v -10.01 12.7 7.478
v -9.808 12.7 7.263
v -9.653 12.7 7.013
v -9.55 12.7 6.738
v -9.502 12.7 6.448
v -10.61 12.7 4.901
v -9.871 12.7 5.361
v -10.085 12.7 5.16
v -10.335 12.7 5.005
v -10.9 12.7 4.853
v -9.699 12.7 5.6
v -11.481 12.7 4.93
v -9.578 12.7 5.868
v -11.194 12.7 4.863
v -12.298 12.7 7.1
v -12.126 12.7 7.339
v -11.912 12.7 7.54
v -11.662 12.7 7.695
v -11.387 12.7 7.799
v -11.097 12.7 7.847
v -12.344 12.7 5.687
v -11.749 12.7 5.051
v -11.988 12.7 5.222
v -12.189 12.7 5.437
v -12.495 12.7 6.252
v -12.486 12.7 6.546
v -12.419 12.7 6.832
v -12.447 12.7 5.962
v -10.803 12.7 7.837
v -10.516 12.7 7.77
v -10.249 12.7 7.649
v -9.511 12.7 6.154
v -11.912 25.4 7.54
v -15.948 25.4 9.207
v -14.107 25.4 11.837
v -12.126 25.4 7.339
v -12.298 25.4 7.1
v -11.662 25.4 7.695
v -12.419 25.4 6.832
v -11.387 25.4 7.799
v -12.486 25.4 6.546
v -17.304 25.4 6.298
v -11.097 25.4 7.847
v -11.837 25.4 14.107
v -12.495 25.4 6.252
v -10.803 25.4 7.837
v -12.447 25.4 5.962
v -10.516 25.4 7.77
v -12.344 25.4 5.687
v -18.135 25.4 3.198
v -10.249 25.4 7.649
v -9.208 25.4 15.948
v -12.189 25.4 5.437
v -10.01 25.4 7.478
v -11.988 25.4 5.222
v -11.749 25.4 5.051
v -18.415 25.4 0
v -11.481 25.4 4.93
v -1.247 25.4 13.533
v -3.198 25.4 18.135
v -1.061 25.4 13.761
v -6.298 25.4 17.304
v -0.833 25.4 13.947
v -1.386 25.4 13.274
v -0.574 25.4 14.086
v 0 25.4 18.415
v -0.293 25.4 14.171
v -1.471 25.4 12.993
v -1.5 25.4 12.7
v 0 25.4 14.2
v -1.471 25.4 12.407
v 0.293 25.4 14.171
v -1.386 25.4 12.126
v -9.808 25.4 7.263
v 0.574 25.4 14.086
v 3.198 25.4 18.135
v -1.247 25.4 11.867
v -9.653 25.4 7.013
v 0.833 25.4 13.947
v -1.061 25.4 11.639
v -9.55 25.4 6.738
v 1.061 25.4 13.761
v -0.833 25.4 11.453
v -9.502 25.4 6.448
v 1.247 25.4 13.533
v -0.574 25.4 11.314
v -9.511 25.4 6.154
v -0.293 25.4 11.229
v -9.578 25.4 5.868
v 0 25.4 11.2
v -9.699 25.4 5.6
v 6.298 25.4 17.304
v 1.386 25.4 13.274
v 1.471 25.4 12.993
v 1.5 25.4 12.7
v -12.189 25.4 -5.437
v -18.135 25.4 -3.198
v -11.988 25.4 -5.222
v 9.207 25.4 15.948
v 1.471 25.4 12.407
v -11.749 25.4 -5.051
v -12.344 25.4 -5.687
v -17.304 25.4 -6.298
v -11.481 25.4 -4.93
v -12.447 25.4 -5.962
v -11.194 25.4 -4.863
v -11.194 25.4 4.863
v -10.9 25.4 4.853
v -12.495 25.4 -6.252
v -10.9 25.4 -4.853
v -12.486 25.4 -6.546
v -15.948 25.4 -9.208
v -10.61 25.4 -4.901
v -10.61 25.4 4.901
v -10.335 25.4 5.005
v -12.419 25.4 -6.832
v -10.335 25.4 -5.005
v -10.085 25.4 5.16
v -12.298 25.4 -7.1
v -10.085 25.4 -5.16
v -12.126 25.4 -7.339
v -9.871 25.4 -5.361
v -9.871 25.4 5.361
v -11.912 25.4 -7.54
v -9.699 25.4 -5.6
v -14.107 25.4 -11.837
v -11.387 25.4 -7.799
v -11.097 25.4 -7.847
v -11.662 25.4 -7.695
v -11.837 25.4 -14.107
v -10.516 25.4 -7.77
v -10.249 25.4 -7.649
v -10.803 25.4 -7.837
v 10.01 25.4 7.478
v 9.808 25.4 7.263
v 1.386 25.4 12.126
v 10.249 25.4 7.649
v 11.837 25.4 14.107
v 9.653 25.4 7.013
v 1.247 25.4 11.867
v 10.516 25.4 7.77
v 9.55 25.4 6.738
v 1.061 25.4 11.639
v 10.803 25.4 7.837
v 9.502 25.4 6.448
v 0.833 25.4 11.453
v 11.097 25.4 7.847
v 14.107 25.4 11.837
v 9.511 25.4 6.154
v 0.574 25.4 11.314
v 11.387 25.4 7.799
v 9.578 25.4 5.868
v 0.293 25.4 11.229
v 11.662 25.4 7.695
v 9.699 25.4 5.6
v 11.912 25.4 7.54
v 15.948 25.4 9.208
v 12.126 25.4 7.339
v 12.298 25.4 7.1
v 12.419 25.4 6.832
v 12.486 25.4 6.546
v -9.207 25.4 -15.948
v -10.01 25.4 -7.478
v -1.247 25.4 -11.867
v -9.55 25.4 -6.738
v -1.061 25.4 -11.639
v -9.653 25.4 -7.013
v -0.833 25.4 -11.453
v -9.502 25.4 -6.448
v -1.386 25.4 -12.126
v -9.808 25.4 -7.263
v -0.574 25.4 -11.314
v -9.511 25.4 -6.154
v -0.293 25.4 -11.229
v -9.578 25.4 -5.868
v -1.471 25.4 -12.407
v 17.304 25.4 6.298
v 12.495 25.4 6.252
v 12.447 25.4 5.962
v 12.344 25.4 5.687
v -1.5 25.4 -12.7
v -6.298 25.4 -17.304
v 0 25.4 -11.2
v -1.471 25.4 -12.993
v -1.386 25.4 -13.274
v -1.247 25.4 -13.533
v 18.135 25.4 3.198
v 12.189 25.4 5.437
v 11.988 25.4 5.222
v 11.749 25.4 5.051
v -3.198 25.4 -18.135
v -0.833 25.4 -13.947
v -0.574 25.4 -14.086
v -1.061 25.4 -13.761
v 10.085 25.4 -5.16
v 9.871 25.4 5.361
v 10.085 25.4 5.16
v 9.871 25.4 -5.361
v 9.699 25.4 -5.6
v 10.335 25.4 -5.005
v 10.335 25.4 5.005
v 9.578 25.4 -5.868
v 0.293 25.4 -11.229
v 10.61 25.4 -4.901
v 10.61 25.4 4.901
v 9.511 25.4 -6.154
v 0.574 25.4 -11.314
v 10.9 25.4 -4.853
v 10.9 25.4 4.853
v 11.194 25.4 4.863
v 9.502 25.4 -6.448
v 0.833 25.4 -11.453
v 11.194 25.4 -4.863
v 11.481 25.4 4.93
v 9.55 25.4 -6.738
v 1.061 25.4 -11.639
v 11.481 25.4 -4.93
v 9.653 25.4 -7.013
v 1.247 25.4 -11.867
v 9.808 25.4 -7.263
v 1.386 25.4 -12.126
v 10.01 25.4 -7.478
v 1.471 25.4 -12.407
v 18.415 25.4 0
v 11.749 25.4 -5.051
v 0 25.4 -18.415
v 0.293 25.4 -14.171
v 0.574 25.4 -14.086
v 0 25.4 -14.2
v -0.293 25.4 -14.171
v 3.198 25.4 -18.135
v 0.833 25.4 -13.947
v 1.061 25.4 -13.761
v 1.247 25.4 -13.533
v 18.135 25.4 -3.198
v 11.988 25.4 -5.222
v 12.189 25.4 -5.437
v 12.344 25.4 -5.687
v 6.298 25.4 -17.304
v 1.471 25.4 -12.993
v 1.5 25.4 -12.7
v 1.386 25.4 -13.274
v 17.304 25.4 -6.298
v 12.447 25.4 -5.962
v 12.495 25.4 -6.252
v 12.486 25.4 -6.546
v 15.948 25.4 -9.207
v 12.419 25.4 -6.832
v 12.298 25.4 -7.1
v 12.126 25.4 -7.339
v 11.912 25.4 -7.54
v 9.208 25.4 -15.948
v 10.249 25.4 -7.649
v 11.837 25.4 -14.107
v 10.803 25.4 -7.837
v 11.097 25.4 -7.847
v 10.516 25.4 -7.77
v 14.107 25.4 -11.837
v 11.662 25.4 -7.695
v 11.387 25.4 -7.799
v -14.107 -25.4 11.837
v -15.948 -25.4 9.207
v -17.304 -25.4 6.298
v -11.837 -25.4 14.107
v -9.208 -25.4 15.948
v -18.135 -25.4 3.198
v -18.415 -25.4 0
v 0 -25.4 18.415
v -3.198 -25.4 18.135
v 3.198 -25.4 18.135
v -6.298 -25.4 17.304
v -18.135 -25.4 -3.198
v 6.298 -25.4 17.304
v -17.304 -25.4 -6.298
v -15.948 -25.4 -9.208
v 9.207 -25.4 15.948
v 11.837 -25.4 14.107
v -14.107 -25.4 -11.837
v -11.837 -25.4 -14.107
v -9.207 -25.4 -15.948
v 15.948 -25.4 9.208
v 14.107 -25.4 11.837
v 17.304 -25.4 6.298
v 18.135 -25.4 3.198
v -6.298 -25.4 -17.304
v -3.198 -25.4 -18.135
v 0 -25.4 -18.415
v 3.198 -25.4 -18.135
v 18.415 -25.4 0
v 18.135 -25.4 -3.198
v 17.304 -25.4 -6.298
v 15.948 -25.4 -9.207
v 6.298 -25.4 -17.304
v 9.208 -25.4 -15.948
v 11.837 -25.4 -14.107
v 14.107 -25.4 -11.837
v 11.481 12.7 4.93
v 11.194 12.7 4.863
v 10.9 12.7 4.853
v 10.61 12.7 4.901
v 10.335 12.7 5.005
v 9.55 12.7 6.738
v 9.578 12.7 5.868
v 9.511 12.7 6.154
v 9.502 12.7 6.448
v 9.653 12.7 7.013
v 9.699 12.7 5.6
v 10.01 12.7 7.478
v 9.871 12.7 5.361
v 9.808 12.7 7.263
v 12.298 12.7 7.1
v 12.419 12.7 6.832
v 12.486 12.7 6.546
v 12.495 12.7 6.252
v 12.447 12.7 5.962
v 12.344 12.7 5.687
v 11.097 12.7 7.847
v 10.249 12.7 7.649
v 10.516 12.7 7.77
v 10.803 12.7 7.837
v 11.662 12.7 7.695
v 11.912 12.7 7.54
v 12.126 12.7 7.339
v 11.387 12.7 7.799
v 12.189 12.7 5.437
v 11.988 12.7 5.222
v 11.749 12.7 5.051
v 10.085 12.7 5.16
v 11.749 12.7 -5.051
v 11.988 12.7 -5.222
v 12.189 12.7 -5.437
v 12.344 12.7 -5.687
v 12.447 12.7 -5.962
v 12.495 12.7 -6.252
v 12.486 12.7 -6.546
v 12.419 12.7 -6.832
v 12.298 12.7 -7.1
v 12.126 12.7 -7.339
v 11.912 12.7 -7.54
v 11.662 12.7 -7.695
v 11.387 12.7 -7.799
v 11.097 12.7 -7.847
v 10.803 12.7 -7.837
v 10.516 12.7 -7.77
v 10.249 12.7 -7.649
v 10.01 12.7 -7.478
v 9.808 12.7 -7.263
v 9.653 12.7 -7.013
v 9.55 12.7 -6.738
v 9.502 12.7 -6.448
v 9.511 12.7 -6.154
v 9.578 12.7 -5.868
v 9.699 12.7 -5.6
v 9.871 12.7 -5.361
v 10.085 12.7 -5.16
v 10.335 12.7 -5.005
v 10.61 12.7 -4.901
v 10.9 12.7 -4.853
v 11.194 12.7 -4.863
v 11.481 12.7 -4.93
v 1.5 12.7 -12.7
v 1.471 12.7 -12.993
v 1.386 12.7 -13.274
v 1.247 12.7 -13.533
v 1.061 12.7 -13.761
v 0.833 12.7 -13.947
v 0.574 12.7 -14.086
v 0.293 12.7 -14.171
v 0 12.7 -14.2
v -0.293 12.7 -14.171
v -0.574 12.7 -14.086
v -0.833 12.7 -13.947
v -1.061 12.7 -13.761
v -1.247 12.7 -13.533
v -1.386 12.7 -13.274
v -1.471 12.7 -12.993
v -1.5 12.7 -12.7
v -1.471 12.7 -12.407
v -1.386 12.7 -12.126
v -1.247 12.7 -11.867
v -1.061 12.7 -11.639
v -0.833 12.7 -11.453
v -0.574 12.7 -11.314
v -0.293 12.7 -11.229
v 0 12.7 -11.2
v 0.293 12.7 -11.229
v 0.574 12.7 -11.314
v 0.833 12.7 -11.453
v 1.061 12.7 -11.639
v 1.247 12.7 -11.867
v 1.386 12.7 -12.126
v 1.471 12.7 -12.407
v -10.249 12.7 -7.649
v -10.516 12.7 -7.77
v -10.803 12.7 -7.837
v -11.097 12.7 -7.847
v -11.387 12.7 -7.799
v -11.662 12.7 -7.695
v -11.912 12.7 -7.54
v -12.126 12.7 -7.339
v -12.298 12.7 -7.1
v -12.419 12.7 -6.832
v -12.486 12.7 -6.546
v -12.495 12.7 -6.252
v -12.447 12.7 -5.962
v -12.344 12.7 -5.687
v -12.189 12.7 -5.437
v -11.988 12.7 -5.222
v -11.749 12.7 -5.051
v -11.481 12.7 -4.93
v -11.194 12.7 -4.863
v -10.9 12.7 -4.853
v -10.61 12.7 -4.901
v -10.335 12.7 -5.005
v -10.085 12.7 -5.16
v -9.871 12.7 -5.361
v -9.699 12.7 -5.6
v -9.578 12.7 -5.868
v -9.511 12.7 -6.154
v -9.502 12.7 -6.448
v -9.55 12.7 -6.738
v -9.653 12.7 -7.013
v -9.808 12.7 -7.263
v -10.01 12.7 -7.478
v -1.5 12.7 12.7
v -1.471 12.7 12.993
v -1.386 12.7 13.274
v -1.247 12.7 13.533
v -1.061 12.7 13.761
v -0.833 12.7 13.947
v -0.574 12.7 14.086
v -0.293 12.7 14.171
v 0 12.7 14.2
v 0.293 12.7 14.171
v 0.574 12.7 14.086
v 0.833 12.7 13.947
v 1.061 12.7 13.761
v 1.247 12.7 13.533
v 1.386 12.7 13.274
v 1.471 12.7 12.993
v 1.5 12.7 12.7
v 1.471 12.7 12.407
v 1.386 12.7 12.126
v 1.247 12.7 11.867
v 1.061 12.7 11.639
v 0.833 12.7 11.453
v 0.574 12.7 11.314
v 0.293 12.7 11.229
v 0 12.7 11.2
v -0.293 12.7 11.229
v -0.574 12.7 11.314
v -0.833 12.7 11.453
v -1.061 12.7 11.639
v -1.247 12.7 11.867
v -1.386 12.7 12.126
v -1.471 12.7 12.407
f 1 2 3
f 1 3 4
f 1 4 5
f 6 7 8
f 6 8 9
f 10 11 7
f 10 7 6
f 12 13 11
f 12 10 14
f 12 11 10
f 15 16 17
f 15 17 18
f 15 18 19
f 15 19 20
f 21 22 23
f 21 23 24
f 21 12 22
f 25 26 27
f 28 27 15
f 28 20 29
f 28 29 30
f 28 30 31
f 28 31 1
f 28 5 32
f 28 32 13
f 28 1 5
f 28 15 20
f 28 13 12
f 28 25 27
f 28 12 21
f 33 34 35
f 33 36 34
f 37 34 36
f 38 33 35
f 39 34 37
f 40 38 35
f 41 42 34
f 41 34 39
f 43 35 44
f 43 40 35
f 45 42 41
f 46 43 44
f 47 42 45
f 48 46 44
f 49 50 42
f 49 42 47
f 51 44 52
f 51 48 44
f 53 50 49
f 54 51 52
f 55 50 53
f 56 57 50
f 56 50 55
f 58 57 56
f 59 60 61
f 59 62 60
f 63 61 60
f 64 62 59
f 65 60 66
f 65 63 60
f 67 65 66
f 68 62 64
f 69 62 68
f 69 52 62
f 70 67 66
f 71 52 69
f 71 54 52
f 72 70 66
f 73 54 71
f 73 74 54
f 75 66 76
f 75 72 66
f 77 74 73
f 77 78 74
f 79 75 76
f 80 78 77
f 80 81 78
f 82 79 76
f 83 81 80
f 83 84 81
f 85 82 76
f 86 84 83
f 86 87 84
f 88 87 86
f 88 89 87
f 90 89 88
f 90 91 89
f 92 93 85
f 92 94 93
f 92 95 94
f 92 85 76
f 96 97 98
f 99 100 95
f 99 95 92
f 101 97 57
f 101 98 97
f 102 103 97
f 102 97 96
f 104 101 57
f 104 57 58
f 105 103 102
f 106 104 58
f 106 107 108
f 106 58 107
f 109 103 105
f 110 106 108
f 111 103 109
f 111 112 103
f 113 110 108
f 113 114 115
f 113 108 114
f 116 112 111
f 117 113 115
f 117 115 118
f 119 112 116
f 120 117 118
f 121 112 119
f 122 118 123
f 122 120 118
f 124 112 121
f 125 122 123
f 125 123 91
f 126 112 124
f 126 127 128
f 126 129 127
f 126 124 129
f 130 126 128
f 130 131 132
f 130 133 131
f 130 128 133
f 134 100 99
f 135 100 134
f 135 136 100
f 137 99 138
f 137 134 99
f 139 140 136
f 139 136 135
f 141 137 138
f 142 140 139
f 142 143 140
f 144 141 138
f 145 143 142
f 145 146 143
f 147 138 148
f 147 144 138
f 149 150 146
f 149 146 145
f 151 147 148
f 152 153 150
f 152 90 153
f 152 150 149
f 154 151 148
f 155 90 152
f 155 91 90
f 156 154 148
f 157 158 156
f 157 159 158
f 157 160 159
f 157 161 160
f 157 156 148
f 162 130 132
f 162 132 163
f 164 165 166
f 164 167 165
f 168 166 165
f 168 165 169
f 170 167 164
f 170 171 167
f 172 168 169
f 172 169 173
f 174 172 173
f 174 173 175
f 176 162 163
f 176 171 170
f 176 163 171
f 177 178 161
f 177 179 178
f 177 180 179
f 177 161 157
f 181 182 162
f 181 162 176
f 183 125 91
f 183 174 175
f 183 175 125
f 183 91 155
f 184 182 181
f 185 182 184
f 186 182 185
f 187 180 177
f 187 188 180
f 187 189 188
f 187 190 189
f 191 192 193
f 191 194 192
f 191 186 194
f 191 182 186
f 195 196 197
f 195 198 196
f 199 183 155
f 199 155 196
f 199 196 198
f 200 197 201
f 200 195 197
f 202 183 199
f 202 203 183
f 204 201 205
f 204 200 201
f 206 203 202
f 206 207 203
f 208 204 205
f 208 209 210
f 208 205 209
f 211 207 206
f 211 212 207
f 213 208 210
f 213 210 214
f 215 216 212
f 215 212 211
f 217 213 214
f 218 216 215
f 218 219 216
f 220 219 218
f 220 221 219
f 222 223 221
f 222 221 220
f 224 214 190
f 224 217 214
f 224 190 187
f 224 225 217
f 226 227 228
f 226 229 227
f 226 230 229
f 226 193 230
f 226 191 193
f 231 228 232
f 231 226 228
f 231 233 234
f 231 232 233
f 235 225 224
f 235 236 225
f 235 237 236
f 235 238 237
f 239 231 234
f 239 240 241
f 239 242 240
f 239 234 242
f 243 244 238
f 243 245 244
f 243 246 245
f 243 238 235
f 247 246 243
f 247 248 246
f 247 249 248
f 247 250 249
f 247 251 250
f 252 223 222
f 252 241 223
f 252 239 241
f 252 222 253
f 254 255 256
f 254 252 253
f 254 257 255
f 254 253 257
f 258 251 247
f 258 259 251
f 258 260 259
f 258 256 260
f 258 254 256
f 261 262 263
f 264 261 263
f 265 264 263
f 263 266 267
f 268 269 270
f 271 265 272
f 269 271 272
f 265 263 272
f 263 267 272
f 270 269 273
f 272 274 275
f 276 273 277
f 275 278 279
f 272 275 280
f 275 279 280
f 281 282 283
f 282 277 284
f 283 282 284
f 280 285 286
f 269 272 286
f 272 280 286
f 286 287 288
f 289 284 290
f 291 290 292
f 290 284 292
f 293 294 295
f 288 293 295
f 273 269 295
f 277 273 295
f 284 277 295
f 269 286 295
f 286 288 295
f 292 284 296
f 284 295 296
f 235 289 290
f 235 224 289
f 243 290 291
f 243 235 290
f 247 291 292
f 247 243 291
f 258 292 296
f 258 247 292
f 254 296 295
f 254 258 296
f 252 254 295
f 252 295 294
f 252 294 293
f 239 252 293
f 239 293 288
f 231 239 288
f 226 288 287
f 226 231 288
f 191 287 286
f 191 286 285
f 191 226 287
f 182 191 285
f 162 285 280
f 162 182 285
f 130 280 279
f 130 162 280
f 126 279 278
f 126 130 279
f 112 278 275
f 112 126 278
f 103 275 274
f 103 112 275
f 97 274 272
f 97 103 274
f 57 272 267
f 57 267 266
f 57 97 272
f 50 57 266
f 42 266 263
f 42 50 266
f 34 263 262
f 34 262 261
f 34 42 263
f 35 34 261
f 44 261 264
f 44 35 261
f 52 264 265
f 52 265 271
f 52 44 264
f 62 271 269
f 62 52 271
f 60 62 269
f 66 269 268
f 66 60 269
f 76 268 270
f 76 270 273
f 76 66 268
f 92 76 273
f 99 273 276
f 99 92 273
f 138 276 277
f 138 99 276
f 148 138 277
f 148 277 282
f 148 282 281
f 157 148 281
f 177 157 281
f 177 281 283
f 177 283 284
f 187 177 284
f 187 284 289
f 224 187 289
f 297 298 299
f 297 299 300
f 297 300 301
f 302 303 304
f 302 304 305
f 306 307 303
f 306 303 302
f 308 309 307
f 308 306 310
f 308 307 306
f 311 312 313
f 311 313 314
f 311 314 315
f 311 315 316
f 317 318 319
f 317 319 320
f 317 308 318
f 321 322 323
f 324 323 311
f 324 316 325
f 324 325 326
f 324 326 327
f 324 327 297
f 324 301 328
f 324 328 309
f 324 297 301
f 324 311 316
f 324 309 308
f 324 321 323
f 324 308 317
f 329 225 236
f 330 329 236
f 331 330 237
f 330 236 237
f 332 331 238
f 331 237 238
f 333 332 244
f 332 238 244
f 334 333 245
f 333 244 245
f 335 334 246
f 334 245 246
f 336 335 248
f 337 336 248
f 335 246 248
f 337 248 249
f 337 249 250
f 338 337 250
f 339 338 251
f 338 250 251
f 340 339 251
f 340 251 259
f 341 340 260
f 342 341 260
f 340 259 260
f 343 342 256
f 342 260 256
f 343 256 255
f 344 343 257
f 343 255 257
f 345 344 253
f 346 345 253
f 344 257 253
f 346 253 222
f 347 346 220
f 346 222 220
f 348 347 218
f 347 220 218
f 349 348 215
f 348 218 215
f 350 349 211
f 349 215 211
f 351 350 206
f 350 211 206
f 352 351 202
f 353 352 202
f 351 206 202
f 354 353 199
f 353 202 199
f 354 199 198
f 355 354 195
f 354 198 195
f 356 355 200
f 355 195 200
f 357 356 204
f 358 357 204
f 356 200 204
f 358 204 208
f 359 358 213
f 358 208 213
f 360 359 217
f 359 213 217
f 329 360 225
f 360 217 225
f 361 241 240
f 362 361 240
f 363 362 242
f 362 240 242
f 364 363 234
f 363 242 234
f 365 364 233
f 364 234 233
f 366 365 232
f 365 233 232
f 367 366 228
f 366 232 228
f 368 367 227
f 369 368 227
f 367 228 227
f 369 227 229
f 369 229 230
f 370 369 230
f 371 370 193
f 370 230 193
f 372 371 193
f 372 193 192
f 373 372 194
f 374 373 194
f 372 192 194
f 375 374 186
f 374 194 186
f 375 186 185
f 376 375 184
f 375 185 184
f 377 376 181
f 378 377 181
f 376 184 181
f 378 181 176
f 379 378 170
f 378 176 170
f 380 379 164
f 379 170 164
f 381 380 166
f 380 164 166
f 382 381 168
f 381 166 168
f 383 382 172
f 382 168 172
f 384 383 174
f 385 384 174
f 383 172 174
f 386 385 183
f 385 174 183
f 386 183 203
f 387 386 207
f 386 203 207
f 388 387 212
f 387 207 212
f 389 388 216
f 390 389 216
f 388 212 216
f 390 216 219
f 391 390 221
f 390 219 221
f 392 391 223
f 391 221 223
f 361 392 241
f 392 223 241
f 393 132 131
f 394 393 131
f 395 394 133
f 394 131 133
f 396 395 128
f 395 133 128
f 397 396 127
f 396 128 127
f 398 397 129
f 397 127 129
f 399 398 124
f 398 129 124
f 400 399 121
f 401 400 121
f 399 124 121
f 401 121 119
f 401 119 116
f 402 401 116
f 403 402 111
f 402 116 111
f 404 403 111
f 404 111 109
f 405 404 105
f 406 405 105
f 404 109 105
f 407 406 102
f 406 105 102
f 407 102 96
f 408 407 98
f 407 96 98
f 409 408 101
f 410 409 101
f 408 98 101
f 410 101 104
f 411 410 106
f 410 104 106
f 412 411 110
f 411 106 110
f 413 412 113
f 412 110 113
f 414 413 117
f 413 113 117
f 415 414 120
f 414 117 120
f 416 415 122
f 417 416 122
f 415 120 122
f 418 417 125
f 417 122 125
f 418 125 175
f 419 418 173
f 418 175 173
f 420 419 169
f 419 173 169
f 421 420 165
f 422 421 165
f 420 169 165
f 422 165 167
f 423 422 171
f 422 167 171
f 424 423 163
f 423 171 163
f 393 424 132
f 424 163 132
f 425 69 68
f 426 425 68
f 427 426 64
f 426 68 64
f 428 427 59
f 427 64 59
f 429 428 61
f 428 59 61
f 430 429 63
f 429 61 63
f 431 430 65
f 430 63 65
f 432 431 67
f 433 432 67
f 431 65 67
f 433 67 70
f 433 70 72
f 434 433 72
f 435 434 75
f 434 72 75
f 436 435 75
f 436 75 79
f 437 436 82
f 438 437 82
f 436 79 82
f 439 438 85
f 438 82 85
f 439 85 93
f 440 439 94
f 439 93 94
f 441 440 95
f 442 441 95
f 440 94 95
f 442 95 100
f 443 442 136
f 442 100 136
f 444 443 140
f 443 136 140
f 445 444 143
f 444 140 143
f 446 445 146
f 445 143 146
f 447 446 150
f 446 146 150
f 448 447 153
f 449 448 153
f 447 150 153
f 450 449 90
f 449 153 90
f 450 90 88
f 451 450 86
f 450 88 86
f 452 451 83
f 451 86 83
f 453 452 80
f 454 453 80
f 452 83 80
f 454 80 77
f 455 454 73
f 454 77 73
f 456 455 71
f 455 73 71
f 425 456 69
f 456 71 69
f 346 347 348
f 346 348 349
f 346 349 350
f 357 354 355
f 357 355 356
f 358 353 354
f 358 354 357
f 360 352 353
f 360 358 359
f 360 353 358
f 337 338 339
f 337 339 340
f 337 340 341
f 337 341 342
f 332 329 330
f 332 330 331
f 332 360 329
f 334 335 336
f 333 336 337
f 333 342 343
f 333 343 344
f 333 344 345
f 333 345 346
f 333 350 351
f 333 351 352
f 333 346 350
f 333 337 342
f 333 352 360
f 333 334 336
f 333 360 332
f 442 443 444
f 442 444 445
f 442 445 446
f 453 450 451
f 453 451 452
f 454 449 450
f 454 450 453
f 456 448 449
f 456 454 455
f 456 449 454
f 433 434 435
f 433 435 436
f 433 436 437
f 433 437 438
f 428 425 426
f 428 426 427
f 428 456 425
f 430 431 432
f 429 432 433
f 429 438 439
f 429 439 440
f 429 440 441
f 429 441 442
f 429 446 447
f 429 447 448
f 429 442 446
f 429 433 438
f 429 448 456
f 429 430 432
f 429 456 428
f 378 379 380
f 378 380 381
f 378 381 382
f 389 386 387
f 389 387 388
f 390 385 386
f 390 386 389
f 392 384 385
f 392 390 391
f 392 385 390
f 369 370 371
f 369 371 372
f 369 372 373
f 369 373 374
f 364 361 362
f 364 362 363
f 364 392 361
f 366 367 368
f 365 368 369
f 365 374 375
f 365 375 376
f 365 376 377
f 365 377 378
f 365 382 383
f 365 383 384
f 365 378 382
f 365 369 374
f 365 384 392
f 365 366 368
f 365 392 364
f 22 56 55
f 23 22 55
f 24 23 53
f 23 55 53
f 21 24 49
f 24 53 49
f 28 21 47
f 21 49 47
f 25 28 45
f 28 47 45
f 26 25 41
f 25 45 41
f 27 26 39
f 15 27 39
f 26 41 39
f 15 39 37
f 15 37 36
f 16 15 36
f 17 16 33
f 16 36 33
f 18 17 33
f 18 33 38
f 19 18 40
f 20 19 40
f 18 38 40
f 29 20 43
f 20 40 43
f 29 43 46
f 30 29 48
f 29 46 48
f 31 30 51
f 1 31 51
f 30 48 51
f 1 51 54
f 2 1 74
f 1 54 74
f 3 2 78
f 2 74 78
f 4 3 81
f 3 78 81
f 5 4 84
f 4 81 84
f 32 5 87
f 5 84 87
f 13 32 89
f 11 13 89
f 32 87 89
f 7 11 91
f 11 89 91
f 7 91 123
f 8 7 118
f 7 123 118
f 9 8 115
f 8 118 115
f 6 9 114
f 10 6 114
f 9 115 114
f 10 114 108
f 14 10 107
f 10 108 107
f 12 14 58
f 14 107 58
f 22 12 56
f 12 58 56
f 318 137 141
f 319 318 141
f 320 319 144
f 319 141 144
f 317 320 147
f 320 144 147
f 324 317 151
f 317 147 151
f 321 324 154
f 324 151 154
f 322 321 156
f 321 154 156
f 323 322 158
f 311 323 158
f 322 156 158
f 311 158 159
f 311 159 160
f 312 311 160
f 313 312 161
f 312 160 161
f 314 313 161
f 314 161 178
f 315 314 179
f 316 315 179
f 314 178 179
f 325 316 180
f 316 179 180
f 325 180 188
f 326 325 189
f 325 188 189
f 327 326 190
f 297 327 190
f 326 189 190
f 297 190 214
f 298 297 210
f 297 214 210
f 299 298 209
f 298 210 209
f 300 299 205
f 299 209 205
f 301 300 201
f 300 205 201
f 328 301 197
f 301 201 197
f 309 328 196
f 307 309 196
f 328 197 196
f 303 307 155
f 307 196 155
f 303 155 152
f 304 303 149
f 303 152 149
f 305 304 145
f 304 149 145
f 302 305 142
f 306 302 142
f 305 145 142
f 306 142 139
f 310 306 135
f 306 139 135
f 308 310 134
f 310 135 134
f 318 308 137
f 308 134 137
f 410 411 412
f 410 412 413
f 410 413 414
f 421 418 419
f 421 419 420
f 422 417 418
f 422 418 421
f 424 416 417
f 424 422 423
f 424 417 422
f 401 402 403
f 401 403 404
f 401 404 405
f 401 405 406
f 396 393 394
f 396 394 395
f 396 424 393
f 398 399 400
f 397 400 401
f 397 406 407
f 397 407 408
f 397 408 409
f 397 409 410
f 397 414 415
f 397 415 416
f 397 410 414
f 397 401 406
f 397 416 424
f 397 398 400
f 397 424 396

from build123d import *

# Parameters (mm, degrees)
SKETCH1_R           = 18.415
BOSS_EXTRUDE1_DEPTH = 25.4
SKETCH2_R           = 1.5
CUT_EXTRUDE1_DEPTH  = 12.7
CIRPATTERN1_COUNT   = 6


with BuildPart() as part:
    # Sketch1 → Boss-Extrude1 (new body, symmetric)
    with BuildSketch(Plane(origin=(0, 0, 0), x_dir=(1, 0, 0), z_dir=(0, 1, 0))):
        Circle(SKETCH1_R)
    extrude(amount=BOSS_EXTRUDE1_DEPTH, both=True)

    # Sketch2 → Cut-Extrude1 (cut)
    with BuildSketch(Plane(origin=(0, 25.4, 0), x_dir=(1, 0, 0), z_dir=(0, 1, 0))):
        with Locations((0, 12.7)):
            Circle(SKETCH2_R)
    cut_extrude1 = extrude(amount=-CUT_EXTRUDE1_DEPTH, mode=Mode.SUBTRACT)

    # CirPattern1: Cut-Extrude1 ×6 about axis
    cirpattern1_axis = Axis((0, 0, 0), (0, 1, 0))
    for i in range(1, CIRPATTERN1_COUNT):
        add(cut_extrude1.rotate(cirpattern1_axis, i * 360 / CIRPATTERN1_COUNT), mode=Mode.SUBTRACT)


solid = part.part
